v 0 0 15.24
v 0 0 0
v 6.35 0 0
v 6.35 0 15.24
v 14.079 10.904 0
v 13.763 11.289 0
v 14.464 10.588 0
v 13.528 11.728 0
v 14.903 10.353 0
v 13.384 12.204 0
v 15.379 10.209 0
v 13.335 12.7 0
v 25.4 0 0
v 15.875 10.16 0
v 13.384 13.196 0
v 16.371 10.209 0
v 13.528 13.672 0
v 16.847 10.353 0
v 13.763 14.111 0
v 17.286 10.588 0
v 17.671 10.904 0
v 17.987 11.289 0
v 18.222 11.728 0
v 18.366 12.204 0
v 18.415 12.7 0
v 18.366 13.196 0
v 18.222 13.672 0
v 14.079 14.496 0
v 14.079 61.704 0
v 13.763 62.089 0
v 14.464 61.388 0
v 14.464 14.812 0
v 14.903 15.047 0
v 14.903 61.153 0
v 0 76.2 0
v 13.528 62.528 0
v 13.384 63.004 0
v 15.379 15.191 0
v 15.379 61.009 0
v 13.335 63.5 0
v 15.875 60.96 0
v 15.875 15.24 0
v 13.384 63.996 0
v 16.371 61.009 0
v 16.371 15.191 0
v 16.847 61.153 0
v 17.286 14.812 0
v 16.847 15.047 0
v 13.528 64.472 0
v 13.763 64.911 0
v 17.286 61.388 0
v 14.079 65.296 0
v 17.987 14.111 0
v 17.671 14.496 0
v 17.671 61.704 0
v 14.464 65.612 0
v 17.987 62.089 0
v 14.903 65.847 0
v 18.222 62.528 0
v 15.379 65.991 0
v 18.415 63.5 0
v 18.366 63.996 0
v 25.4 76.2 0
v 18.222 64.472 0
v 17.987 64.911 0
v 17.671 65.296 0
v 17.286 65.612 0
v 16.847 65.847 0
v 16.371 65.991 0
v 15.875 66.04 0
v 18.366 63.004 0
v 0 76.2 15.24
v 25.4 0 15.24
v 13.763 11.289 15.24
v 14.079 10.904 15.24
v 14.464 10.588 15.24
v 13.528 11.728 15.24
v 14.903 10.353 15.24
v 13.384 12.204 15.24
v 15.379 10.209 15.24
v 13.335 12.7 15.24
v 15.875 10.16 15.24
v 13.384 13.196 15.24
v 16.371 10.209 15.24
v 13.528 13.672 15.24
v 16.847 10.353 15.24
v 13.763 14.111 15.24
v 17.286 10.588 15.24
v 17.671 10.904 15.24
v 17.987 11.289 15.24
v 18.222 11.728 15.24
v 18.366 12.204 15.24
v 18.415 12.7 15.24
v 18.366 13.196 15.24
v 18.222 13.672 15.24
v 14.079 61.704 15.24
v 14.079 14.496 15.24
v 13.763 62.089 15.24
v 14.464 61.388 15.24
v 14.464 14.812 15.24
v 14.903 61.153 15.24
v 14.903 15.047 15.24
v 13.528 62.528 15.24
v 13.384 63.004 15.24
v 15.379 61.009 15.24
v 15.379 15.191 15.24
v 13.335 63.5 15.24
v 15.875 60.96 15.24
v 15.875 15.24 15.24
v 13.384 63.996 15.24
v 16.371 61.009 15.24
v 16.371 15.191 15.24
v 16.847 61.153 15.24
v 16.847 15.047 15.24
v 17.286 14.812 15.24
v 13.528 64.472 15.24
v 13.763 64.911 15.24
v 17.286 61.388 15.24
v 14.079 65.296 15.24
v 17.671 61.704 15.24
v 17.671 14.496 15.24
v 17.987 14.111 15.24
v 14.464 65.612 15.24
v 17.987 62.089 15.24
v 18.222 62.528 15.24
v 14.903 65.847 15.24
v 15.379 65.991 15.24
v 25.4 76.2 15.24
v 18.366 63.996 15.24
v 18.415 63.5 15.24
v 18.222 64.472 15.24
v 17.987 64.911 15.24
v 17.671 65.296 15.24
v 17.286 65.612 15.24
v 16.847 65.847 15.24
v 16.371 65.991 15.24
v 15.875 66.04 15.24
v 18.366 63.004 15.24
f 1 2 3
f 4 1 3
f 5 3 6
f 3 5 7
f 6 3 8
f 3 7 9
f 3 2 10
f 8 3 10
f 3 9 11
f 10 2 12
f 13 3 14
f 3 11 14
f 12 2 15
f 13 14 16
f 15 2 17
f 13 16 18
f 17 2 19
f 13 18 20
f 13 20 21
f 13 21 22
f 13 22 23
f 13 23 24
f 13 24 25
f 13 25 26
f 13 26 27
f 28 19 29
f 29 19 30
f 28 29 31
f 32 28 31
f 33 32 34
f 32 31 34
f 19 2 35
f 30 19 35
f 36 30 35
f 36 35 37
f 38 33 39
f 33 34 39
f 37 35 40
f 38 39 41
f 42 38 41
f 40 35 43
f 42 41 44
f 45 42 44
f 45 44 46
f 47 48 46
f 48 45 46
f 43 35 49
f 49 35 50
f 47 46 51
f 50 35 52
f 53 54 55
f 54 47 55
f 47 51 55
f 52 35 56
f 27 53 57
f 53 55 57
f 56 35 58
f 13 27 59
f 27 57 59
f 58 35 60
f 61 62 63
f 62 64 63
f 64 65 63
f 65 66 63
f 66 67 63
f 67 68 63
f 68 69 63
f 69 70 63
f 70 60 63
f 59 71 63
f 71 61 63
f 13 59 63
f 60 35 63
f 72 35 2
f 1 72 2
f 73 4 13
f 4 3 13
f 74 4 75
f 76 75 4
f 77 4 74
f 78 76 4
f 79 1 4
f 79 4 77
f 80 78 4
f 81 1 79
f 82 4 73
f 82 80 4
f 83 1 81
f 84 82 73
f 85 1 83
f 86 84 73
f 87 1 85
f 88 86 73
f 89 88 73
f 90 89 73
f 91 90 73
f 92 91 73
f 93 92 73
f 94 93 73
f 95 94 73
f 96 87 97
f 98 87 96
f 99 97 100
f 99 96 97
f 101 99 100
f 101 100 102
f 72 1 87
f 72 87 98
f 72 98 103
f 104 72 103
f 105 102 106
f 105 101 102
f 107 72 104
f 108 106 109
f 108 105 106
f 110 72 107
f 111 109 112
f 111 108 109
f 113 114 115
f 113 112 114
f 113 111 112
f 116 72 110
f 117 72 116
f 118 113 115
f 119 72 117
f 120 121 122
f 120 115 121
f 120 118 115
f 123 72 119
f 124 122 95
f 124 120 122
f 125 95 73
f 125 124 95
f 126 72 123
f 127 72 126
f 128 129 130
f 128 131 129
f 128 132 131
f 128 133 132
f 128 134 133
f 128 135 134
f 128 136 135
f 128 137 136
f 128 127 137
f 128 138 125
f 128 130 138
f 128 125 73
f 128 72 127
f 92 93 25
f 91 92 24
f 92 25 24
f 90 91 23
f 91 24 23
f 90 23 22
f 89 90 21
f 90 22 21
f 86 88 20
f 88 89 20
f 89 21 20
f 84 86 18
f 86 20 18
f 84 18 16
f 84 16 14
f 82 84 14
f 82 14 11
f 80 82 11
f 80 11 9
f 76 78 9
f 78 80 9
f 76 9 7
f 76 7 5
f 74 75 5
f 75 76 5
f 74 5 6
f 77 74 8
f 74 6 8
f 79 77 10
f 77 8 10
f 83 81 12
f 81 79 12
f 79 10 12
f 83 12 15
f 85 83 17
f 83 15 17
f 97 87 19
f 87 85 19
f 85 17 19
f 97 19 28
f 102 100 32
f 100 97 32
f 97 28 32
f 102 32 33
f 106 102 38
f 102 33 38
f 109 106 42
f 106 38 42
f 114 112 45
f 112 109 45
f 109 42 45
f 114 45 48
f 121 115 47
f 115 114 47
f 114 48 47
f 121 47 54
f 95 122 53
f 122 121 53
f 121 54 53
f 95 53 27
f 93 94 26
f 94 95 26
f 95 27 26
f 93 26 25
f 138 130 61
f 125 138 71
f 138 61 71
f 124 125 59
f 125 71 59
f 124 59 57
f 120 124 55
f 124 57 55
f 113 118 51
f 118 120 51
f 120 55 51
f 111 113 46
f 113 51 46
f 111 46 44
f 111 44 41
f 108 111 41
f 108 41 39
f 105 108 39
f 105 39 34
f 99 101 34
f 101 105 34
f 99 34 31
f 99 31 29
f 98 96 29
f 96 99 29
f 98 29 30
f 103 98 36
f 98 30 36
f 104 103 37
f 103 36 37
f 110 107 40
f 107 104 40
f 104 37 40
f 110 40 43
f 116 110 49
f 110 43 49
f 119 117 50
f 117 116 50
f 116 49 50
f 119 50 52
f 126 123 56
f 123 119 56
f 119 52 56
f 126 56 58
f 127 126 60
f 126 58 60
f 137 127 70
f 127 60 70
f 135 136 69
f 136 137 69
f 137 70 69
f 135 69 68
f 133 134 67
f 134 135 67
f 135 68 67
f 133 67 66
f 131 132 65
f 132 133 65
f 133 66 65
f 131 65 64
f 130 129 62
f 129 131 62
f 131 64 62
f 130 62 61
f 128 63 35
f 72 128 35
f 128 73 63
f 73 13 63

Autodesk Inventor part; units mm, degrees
ref_plane "YZ Plane" through (0, 0, 0) normal (1, 0, 0) x (0, 1, 0)
ref_plane "XZ Plane" through (0, 0, 0) normal (0, 1, 0) x (-1, 0, 0)
ref_plane "XY Plane" through (0, 0, 0) normal (0, 0, 1) x (1, 0, 0)
sketch "Sketch1" plane through (0, 0, 0) normal (0, 0, 1) x (1, 0, 0)
  line L0 (0, 0) -> (25.4, 0)
  line L1 (25.4, 0) -> (25.4, 76.2)
  line L2 (25.4, 76.2) -> (0, 76.2)
  line L3 (0, 76.2) -> (0, 0)
  line L4 (0, 0) -> (6.35, 0)
  line L5 (6.35, 0) -> (6.35, 76.2) construction
  line L6 (6.35, 0) -> (25.4, 0)
  line L7 (15.875, 0) -> (15.875, 76.2) construction
  line L8 (15.875, 0) -> (15.875, 12.7) construction
  line L9 (15.875, 76.2) -> (15.875, 63.5) construction
  circle A0 centre (15.875, 12.7) radius 2.54
  circle A1 centre (15.875, 63.5) radius 2.54
  dimension "d0" = 25.4
  dimension "d1" = 76.2
  dimension "d2" = 6.35
  dimension "d3" = 12.7
  dimension "d4" = 12.7
  dimension "d5" = 5.08
extrude "Extrusion1" add sketch "Sketch1" along normal blind 15.24
properties part number "Beefy Spacer" material "Aluminum 6061"
